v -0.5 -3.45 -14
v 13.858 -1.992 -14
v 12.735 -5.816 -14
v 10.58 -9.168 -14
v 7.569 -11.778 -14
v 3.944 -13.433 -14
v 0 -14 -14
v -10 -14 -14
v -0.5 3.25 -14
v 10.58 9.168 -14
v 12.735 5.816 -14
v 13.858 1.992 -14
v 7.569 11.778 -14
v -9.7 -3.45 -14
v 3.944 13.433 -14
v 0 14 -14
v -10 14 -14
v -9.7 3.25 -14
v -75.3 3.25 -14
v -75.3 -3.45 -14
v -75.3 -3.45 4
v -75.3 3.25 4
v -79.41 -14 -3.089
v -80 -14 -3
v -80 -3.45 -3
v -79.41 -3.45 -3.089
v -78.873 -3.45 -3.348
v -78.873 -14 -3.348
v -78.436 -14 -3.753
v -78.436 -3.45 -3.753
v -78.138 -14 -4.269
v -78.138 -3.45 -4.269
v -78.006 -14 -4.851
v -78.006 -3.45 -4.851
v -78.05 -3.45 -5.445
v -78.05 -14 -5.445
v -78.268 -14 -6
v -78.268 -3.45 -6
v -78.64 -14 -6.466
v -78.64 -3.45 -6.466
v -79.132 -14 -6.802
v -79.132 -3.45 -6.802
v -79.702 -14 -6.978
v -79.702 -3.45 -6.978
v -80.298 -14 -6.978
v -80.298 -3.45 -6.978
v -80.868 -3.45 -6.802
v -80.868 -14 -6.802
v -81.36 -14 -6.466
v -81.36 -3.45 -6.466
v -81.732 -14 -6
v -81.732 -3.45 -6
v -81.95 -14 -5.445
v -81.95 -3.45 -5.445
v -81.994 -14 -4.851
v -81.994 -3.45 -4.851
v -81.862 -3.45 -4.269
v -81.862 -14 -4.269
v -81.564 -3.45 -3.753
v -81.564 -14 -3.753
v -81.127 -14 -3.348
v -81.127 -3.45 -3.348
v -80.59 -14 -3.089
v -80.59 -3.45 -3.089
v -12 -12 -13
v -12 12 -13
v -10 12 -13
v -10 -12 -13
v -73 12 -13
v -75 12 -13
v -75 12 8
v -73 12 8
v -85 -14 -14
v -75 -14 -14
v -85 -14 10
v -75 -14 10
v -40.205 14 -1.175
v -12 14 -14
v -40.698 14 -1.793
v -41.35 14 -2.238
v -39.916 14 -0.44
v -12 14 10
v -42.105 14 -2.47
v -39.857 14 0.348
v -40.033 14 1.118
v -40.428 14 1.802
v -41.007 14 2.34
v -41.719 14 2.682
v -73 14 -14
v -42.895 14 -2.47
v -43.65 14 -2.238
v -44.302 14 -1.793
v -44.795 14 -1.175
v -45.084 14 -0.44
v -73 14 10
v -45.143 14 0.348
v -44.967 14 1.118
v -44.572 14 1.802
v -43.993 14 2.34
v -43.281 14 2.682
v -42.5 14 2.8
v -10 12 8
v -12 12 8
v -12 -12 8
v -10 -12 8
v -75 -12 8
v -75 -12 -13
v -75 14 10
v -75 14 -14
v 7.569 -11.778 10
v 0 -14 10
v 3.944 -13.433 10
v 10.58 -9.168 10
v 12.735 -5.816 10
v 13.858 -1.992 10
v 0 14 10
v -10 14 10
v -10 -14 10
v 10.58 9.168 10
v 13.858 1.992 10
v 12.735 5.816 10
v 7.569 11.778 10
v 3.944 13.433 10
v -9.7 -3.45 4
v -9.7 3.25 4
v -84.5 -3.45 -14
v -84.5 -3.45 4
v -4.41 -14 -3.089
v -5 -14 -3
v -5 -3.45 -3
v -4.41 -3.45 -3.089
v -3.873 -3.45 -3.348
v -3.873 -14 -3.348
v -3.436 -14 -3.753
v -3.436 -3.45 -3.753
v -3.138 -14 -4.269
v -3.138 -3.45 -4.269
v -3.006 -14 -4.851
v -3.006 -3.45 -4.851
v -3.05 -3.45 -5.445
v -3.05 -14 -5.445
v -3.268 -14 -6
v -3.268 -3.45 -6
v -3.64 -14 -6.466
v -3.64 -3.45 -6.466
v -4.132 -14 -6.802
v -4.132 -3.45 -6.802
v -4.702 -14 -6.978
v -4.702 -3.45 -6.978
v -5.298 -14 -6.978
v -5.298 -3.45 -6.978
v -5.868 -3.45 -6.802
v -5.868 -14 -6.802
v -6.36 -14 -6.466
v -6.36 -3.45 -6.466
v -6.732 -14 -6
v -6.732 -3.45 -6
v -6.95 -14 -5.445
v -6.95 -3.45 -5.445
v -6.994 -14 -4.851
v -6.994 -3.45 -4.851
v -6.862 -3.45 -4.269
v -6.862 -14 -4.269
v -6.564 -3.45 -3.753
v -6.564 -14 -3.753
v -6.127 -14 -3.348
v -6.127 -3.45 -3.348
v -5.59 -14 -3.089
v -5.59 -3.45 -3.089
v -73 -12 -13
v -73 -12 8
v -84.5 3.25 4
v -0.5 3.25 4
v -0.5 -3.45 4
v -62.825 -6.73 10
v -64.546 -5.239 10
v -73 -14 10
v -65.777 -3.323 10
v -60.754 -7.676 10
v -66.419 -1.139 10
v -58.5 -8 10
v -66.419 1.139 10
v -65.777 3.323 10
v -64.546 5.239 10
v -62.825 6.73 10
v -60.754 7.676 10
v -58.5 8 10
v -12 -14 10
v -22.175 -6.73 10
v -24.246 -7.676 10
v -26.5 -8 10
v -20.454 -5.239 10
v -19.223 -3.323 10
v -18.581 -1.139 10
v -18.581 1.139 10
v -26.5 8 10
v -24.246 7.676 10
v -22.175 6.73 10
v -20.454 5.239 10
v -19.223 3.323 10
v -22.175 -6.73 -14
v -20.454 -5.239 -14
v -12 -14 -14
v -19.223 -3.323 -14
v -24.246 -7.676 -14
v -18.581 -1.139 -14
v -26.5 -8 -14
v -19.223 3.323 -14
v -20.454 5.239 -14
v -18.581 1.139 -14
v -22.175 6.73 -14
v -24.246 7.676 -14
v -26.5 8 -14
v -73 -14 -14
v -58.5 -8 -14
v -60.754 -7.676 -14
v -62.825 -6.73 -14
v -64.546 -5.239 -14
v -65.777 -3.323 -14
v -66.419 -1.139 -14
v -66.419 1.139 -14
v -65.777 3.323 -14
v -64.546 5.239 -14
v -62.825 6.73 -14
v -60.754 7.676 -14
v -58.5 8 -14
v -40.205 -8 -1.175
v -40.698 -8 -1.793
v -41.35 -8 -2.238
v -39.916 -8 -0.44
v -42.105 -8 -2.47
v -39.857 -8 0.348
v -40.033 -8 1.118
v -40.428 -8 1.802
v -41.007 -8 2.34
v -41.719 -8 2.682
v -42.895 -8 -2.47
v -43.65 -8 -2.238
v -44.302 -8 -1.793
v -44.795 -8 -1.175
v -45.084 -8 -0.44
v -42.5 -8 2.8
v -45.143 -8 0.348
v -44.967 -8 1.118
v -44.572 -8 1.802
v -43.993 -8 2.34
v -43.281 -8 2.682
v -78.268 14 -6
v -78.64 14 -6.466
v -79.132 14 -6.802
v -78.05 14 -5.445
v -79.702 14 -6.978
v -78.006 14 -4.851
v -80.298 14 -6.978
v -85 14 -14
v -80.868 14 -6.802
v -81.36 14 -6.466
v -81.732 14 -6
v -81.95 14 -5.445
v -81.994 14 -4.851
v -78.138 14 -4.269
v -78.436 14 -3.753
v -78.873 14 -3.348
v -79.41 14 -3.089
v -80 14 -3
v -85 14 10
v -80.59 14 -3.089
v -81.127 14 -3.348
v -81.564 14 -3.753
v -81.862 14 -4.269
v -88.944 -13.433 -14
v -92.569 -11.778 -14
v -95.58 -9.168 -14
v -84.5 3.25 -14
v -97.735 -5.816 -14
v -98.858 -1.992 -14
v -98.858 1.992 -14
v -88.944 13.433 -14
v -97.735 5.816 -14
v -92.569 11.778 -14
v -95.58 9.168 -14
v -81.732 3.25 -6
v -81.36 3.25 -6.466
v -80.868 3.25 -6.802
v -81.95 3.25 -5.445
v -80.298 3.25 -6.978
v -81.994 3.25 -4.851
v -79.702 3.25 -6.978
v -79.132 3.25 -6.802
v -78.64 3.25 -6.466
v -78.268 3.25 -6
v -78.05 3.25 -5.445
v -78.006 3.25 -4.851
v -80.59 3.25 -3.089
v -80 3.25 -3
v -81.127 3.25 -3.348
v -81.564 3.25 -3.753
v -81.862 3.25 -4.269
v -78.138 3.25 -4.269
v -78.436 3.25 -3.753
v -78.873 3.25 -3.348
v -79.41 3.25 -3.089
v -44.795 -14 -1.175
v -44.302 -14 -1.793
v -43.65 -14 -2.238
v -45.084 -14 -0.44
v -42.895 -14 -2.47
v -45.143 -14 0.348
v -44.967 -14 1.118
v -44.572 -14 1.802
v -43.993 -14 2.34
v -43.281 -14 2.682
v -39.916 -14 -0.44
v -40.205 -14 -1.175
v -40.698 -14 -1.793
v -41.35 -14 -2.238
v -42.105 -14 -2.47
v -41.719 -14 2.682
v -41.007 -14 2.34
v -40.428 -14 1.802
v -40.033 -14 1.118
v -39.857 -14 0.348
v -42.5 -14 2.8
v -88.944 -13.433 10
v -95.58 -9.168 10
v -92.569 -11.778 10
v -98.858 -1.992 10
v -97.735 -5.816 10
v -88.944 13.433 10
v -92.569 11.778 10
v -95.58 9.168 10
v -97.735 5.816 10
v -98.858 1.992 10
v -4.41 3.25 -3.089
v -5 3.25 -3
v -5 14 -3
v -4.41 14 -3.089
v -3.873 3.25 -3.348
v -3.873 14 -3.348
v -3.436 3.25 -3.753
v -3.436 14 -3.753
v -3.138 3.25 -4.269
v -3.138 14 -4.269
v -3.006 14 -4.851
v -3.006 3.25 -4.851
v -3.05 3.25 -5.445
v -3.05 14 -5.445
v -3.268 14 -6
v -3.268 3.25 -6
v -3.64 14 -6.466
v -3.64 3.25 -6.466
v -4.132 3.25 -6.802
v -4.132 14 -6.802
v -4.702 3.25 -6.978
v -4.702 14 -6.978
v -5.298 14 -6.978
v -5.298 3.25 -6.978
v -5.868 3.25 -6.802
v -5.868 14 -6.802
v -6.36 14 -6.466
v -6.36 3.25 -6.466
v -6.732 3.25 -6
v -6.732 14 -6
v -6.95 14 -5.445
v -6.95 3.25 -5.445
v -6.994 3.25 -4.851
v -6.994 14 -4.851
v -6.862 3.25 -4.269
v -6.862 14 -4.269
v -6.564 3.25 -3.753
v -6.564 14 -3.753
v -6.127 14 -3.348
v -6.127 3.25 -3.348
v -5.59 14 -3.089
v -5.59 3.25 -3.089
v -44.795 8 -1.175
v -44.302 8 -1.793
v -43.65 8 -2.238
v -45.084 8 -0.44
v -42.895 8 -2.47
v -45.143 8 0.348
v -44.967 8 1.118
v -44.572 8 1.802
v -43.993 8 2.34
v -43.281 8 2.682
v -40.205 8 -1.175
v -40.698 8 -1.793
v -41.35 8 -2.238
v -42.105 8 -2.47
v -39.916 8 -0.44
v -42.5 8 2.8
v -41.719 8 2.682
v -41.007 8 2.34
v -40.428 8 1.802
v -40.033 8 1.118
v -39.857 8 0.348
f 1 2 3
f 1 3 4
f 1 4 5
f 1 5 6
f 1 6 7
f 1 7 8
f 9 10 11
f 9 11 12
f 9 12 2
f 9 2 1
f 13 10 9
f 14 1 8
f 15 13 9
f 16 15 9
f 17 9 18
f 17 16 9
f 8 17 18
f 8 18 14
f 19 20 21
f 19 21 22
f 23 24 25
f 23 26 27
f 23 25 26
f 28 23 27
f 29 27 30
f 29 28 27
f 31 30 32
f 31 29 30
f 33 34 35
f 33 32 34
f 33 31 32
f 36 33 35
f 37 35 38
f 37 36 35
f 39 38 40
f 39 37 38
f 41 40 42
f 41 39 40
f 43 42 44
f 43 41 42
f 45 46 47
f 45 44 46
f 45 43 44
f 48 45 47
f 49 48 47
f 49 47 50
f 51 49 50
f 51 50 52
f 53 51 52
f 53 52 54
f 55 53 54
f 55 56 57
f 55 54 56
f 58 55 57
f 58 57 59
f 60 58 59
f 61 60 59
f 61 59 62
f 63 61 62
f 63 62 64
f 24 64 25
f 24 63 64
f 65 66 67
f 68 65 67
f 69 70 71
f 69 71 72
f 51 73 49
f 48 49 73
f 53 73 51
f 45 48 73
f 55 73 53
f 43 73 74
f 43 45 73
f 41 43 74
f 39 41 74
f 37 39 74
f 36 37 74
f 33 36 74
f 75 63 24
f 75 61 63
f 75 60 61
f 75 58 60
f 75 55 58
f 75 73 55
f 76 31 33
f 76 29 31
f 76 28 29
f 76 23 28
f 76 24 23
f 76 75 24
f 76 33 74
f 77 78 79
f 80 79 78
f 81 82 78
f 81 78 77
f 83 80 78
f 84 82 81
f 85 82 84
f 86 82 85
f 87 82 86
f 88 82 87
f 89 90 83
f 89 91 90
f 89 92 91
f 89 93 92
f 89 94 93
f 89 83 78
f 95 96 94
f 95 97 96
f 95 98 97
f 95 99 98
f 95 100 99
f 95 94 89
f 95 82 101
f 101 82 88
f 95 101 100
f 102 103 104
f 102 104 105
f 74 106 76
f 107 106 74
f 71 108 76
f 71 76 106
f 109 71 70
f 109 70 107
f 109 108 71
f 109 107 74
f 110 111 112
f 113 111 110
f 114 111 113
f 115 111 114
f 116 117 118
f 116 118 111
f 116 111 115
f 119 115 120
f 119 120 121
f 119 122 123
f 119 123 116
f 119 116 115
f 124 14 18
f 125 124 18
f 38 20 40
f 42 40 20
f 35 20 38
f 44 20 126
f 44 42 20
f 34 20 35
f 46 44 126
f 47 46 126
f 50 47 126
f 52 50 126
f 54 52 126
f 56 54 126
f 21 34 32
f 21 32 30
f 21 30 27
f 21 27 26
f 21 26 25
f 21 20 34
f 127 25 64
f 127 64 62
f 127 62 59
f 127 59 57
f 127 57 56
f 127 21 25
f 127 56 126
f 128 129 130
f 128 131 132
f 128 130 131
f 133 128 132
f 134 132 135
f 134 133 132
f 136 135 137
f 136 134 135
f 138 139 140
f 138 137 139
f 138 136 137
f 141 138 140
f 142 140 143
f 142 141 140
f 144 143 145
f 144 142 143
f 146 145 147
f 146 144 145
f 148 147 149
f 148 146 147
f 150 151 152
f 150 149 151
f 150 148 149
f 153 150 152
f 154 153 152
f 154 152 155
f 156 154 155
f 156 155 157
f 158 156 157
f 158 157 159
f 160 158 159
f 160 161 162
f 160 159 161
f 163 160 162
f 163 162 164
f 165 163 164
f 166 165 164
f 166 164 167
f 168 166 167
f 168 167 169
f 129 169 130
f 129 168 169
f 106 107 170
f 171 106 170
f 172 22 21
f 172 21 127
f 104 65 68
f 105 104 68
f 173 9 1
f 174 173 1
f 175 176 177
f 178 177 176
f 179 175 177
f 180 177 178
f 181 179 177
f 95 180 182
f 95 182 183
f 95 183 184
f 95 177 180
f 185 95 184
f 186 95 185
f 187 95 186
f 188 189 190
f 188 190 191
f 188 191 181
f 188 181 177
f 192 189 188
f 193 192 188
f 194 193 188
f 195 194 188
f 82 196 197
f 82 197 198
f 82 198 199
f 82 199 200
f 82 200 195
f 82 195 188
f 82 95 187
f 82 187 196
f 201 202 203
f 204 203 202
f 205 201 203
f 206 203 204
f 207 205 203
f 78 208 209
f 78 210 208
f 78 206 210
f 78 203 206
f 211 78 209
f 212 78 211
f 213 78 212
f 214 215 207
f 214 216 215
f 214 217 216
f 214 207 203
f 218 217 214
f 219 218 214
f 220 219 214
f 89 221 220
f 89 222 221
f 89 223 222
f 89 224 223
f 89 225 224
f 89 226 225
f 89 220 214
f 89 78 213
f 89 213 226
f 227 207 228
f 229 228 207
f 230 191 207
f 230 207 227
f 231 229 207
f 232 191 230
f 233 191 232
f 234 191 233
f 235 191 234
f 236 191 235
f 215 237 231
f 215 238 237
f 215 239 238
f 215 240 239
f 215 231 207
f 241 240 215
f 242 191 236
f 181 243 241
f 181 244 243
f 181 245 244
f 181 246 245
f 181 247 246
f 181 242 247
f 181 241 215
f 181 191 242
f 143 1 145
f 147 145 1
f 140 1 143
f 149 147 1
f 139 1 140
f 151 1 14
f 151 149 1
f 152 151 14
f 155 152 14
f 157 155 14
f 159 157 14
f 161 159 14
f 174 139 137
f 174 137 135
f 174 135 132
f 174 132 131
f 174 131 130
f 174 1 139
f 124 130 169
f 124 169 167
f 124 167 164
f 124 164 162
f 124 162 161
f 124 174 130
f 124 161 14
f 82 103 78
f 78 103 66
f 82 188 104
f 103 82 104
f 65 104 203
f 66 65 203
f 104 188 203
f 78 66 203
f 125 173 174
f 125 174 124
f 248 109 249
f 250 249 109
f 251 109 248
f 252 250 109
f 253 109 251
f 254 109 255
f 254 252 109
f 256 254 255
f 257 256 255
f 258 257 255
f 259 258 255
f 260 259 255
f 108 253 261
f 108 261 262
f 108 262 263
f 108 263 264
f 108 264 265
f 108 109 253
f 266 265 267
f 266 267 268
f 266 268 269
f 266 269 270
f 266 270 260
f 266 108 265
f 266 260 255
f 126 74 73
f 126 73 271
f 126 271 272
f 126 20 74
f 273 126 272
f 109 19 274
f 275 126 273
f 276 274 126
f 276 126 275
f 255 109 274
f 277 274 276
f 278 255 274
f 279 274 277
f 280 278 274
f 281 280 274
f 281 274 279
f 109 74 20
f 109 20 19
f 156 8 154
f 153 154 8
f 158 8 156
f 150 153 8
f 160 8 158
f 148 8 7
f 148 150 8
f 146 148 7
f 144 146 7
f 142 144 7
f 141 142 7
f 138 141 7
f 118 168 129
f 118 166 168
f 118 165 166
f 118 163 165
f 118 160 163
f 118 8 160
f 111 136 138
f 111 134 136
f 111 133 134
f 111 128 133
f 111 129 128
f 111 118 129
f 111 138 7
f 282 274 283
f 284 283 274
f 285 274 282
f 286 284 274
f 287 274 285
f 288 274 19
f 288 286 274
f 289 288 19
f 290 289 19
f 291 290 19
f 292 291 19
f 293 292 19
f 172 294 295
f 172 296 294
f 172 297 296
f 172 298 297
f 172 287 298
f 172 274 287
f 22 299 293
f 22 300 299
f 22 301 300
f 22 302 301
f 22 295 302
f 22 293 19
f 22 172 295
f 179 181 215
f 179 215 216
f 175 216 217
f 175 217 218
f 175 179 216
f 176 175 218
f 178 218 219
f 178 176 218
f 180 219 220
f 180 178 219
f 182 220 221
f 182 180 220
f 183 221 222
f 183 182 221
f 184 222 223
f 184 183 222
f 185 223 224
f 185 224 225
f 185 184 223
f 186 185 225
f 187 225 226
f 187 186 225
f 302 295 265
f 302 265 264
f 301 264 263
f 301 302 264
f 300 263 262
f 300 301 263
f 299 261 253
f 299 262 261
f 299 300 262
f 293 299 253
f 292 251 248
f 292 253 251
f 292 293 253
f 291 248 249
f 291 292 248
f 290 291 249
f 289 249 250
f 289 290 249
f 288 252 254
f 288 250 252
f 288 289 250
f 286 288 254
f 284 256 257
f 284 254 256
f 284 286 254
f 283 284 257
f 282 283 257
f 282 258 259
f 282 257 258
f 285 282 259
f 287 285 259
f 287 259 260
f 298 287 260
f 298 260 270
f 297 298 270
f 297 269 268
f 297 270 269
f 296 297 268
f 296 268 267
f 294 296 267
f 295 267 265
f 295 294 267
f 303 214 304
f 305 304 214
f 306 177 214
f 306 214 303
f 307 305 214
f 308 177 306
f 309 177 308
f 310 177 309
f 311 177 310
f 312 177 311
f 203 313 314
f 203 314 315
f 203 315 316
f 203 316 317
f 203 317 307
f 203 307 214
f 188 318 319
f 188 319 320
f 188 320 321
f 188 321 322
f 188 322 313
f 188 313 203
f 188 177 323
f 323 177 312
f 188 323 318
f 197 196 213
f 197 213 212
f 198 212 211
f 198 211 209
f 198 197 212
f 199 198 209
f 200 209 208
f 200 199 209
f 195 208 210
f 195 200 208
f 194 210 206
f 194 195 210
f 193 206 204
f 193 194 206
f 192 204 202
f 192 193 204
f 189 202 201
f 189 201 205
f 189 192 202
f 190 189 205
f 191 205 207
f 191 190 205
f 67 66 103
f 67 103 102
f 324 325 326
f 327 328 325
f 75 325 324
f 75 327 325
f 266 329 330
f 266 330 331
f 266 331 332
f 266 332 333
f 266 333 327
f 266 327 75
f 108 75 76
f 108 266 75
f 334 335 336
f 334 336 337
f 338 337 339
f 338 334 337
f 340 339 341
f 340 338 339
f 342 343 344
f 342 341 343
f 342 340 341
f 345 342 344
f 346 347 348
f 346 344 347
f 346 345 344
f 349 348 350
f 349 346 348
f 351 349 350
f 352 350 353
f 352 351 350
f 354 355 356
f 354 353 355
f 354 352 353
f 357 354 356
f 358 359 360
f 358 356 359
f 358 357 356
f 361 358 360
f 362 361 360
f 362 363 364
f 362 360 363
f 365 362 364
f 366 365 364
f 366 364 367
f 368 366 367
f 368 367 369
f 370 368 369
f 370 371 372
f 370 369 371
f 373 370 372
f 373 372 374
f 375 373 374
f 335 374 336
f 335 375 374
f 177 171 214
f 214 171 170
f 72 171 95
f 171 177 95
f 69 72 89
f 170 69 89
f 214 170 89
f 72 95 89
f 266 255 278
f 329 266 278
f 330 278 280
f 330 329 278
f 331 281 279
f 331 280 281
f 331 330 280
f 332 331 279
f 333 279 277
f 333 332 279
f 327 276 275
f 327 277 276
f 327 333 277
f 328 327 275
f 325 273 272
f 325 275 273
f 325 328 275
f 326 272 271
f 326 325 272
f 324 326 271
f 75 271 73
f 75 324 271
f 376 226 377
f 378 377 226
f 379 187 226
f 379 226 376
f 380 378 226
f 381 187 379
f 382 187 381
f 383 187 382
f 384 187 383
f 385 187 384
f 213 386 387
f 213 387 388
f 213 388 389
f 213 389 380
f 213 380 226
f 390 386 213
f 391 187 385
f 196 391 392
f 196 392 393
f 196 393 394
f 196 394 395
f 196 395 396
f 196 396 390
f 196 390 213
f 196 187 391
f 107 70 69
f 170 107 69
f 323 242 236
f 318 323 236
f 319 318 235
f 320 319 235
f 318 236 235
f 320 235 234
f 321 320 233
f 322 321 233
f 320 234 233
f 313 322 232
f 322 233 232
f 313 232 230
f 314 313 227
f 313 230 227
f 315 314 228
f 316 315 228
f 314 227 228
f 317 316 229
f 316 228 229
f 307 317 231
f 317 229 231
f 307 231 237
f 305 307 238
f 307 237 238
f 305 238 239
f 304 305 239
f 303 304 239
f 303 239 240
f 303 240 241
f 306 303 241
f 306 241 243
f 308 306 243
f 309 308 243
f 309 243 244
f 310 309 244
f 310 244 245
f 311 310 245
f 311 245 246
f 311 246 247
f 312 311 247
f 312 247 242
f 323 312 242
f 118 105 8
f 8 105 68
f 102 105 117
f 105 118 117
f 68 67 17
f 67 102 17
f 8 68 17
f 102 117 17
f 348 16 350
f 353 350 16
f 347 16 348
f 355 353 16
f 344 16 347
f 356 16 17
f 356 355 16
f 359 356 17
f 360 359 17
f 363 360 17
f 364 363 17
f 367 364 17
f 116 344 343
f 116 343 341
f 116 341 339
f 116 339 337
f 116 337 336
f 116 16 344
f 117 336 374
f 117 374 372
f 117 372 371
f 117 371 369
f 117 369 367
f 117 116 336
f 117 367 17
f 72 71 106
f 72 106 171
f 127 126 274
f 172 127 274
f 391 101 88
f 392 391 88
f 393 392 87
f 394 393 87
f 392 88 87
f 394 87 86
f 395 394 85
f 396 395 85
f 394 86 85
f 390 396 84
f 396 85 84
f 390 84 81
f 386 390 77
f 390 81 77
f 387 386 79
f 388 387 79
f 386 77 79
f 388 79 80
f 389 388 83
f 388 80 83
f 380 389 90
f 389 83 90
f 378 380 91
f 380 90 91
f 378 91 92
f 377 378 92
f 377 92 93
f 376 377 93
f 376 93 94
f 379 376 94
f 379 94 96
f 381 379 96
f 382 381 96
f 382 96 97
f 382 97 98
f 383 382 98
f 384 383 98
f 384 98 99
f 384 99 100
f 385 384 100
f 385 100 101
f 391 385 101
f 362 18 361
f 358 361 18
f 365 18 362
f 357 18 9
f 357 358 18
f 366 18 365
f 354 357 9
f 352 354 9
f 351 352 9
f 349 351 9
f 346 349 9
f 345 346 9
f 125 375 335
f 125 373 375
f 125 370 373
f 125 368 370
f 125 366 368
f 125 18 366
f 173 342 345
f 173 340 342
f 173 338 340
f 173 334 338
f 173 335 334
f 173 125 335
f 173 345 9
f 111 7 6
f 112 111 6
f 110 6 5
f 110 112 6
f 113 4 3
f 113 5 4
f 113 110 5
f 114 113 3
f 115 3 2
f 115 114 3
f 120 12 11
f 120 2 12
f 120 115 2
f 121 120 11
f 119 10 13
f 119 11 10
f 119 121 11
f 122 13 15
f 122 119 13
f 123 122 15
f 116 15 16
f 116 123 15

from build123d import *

# Parameters (mm, degrees)
EXTRUDE_1_DEPTH          = 14
EXTRUDE_START            = 10
EXTRUDE_2_DEPTH          = 10
CUT_EXTRUDE_1_DEPTH      = 104.831594421
CUT_EXTRUDE_1_DEPTH_BACK = 104.831594421
SKETCH_3_R               = 2
SKETCH_4_R               = 2.65
CUT_EXTRUDE_2_DEPTH      = 104.831594421
SKETCH_6_W               = 2
SKETCH_6_H               = 24
CUT_EXTRUDE_3_DEPTH      = 2
SKETCH_7_W               = 2
SKETCH_7_H               = 24
CUT_EXTRUDE_4_DEPTH      = 2
SKETCH_8_W               = 2
SKETCH_8_H               = 28
CUT_EXTRUDE_5_DEPTH      = 2
CUT_EXTRUDE_6_DEPTH      = 104.831594421
CUT_EXTRUDE_6_DEPTH_BACK = 104.831594421
SKETCH_9_W               = 2
SKETCH_9_H               = 1
SKETCH_10_W              = 9.2
SKETCH_10_H              = 6.7
CUT_EXTRUDE_7_DEPTH      = 4


with BuildPart() as part:
    # 草图2 → 凸台-拉伸1 (new body)
    with BuildSketch(Plane.XY):
        with BuildLine():
            Line((0, 14), (-85, 14))
            ThreePointArc((-85, 14), (-99, 0), (-85, -14))
            Line((-85, -14), (0, -14))
            ThreePointArc((0, -14), (14, 0), (0, 14))
        make_face()
        Polygon((-84.5, 2.444987437), (-84.5, 3.05), (-84.5, 3.25), (-84.3, 3.25), (-75.7, 3.25), (-75.481671923, 3.25), (-75.3, 3.25), (-75.3, -3.45), (-75.481671923, -3.45), (-84.5, -3.45), (-84.5, -3.05), (-84.5, 0.455012563), align=None, mode=Mode.SUBTRACT)
        with BuildLine():
            ThreePointArc((-26.5, 8), (-18.5, 0), (-26.5, -8))
            Line((-26.5, -8), (-58.5, -8))
            ThreePointArc((-58.5, -8), (-66.5, 0), (-58.5, 8))
            Line((-58.5, 8), (-26.5, 8))
        make_face(mode=Mode.SUBTRACT)
        Polygon((-9.7, -3.45), (-9.7, 3.25), (-9.518328077, 3.25), (-0.5, 3.25), (-0.5, 3.05), (-0.5, -3.45), (-9.518328077, -3.45), align=None, mode=Mode.SUBTRACT)
    extrude(amount=-EXTRUDE_1_DEPTH)

    # 草图2<3> → 凸台-拉伸2 (add)
    with BuildSketch(Plane.XY.offset(EXTRUDE_START)):
        with BuildLine():
            Line((0, 14), (-85, 14))
            ThreePointArc((-85, 14), (-99, 0), (-85, -14))
            Line((-85, -14), (0, -14))
            ThreePointArc((0, -14), (14, 0), (0, 14))
        make_face()
        with BuildLine():
            ThreePointArc((-26.5, 8), (-18.5, 0), (-26.5, -8))
            Line((-26.5, -8), (-58.5, -8))
            ThreePointArc((-58.5, -8), (-66.5, 0), (-58.5, 8))
            Line((-58.5, 8), (-26.5, 8))
        make_face(mode=Mode.SUBTRACT)
    extrude(amount=-EXTRUDE_2_DEPTH)

    # 草图3 → 切除-拉伸1 (cut, two sides: drawn at the far end of the back side and taken through both)
    with BuildSketch(Plane(origin=(0, 14, 0), x_dir=(1, 0, 0), z_dir=(0, 1, 0)).offset(-CUT_EXTRUDE_1_DEPTH_BACK)):
        with Locations((-5, 5)):
            Circle(SKETCH_3_R)
        with Locations((-80, 5)):
            Circle(SKETCH_3_R)
    extrude(amount=CUT_EXTRUDE_1_DEPTH + CUT_EXTRUDE_1_DEPTH_BACK, mode=Mode.SUBTRACT)

    # 草图4 → 切除-拉伸2 (cut, through all)
    with BuildSketch(Plane(origin=(0, 14, 0), x_dir=(1, 0, 0), z_dir=(0, 1, 0))):
        with Locations((-42.5, -0.15)):
            Circle(SKETCH_4_R)
    extrude(amount=-CUT_EXTRUDE_2_DEPTH, mode=Mode.SUBTRACT)

    # 草图6 → 切除-拉伸3 (cut)
    with BuildSketch(Plane(origin=(0, 14, 0), x_dir=(1, 0, 0), z_dir=(0, 1, 0))):
        with Locations((-11, 2)):
            Rectangle(SKETCH_6_W, SKETCH_6_H)
    cut_extrude_3 = extrude(amount=-CUT_EXTRUDE_3_DEPTH, mode=Mode.SUBTRACT)

    # 镜向1: 切除-拉伸3 across plane
    add(cut_extrude_3.mirror(Plane.ZX), mode=Mode.SUBTRACT)

    # 草图7 → 切除-拉伸4 (cut)
    with BuildSketch(Plane(origin=(0, 14, 0), x_dir=(1, 0, 0), z_dir=(0, 1, 0))):
        with Locations((-74, 2)):
            Rectangle(SKETCH_7_W, SKETCH_7_H)
    cut_extrude_4 = extrude(amount=-CUT_EXTRUDE_4_DEPTH, mode=Mode.SUBTRACT)

    # 镜向2: 切除-拉伸4 across plane
    add(cut_extrude_4.mirror(Plane.ZX), mode=Mode.SUBTRACT)

    # 草图8 → 切除-拉伸5 (cut)
    with BuildSketch(Plane.XY.offset(10)):
        with Locations((-11, 0)):
            Rectangle(SKETCH_8_W, SKETCH_8_H)
        with Locations((-74, 0)):
            Rectangle(SKETCH_8_W, SKETCH_8_H)
    extrude(amount=-CUT_EXTRUDE_5_DEPTH, mode=Mode.SUBTRACT)

    # 草图9 → 切除-拉伸6 (cut, two sides: drawn at the far end of the back side and taken through both)
    with BuildSketch(Plane.XZ.offset(14).offset(-CUT_EXTRUDE_6_DEPTH_BACK)):
        with Locations((-74, -13.5)):
            Rectangle(SKETCH_9_W, SKETCH_9_H)
        with Locations((-11, -13.5)):
            Rectangle(SKETCH_9_W, SKETCH_9_H)
    extrude(amount=CUT_EXTRUDE_6_DEPTH + CUT_EXTRUDE_6_DEPTH_BACK, mode=Mode.SUBTRACT)

    # 草图10 → 切除-拉伸7 (cut)
    with BuildSketch(Plane(origin=(0, 0, 0), x_dir=(-1, 0, 0), z_dir=(0, 0, -1))):
        with Locations((79.9, -0.1)):
            Rectangle(SKETCH_10_W, SKETCH_10_H)
        with Locations((5.1, -0.1)):
            Rectangle(SKETCH_10_W, SKETCH_10_H)
    extrude(amount=-CUT_EXTRUDE_7_DEPTH, mode=Mode.SUBTRACT)


solid = part.part
